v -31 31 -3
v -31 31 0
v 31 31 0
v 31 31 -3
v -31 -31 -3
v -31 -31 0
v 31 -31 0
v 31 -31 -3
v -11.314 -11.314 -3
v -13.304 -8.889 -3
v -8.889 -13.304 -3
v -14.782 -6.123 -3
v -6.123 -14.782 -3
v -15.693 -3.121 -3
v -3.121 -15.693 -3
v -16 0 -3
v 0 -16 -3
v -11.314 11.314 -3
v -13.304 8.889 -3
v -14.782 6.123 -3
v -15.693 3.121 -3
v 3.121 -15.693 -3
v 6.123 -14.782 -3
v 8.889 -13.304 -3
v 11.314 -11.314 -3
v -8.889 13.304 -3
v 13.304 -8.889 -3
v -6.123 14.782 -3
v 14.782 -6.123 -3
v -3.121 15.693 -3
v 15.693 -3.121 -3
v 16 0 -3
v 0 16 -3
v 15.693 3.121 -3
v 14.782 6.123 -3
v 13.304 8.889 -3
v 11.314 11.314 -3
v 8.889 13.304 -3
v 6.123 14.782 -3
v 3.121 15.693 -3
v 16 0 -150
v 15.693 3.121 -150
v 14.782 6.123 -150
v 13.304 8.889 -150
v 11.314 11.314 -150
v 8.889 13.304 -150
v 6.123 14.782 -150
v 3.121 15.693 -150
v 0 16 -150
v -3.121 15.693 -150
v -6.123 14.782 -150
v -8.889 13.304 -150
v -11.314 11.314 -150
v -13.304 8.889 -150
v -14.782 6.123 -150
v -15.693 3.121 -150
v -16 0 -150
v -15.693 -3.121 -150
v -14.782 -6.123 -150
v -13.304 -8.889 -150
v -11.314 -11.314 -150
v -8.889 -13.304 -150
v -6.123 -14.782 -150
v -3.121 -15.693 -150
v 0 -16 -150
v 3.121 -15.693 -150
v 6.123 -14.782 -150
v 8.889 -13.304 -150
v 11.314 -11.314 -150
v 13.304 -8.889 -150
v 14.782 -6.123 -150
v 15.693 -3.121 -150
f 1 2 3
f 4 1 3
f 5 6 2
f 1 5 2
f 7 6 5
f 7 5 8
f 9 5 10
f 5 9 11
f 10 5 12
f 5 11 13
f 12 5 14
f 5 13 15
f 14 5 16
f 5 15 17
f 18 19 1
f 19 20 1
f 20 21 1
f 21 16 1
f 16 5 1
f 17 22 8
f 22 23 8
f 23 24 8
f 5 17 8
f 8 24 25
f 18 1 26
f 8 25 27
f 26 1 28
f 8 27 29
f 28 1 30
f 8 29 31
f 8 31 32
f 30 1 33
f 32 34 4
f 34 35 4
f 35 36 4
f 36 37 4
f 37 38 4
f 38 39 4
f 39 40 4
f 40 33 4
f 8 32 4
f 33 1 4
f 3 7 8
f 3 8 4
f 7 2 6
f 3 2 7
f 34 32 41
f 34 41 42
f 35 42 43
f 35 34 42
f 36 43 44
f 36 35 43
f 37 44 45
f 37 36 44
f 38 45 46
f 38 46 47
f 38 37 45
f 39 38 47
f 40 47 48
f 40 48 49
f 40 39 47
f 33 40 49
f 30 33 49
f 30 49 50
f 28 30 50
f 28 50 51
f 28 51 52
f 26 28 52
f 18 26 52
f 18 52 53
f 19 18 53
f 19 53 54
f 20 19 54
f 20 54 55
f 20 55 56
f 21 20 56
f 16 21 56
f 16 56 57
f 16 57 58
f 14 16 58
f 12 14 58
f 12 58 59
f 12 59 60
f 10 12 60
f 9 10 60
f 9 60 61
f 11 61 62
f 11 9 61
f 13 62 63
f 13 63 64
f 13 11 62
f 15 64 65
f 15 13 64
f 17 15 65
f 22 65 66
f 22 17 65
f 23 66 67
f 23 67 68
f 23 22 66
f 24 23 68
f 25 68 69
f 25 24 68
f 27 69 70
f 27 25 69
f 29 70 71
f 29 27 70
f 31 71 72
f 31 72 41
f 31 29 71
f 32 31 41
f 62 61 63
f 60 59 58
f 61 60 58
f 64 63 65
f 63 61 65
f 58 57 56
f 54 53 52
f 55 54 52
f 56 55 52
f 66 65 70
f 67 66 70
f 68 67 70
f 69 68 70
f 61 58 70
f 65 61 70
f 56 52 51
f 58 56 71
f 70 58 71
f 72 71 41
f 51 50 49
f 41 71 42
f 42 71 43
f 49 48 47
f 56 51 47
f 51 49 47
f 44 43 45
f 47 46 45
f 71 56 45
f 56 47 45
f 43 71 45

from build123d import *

# Parameters (mm, degrees)
F0_R     = 16
F1_DEPTH = 150
F2_W     = 62
F2_H     = 62
F3_DEPTH = 3


with BuildPart() as f1:
    # F0 (on Top) → F1 (new body)
    with BuildSketch(Plane.XY):
        Circle(F0_R)
    extrude(amount=-F1_DEPTH)

    # F2 (on Top) → F3 (join)
    with BuildSketch(Plane.XY):
        Rectangle(F2_W, F2_H)
    extrude(amount=-F3_DEPTH)


solid = f1.part
